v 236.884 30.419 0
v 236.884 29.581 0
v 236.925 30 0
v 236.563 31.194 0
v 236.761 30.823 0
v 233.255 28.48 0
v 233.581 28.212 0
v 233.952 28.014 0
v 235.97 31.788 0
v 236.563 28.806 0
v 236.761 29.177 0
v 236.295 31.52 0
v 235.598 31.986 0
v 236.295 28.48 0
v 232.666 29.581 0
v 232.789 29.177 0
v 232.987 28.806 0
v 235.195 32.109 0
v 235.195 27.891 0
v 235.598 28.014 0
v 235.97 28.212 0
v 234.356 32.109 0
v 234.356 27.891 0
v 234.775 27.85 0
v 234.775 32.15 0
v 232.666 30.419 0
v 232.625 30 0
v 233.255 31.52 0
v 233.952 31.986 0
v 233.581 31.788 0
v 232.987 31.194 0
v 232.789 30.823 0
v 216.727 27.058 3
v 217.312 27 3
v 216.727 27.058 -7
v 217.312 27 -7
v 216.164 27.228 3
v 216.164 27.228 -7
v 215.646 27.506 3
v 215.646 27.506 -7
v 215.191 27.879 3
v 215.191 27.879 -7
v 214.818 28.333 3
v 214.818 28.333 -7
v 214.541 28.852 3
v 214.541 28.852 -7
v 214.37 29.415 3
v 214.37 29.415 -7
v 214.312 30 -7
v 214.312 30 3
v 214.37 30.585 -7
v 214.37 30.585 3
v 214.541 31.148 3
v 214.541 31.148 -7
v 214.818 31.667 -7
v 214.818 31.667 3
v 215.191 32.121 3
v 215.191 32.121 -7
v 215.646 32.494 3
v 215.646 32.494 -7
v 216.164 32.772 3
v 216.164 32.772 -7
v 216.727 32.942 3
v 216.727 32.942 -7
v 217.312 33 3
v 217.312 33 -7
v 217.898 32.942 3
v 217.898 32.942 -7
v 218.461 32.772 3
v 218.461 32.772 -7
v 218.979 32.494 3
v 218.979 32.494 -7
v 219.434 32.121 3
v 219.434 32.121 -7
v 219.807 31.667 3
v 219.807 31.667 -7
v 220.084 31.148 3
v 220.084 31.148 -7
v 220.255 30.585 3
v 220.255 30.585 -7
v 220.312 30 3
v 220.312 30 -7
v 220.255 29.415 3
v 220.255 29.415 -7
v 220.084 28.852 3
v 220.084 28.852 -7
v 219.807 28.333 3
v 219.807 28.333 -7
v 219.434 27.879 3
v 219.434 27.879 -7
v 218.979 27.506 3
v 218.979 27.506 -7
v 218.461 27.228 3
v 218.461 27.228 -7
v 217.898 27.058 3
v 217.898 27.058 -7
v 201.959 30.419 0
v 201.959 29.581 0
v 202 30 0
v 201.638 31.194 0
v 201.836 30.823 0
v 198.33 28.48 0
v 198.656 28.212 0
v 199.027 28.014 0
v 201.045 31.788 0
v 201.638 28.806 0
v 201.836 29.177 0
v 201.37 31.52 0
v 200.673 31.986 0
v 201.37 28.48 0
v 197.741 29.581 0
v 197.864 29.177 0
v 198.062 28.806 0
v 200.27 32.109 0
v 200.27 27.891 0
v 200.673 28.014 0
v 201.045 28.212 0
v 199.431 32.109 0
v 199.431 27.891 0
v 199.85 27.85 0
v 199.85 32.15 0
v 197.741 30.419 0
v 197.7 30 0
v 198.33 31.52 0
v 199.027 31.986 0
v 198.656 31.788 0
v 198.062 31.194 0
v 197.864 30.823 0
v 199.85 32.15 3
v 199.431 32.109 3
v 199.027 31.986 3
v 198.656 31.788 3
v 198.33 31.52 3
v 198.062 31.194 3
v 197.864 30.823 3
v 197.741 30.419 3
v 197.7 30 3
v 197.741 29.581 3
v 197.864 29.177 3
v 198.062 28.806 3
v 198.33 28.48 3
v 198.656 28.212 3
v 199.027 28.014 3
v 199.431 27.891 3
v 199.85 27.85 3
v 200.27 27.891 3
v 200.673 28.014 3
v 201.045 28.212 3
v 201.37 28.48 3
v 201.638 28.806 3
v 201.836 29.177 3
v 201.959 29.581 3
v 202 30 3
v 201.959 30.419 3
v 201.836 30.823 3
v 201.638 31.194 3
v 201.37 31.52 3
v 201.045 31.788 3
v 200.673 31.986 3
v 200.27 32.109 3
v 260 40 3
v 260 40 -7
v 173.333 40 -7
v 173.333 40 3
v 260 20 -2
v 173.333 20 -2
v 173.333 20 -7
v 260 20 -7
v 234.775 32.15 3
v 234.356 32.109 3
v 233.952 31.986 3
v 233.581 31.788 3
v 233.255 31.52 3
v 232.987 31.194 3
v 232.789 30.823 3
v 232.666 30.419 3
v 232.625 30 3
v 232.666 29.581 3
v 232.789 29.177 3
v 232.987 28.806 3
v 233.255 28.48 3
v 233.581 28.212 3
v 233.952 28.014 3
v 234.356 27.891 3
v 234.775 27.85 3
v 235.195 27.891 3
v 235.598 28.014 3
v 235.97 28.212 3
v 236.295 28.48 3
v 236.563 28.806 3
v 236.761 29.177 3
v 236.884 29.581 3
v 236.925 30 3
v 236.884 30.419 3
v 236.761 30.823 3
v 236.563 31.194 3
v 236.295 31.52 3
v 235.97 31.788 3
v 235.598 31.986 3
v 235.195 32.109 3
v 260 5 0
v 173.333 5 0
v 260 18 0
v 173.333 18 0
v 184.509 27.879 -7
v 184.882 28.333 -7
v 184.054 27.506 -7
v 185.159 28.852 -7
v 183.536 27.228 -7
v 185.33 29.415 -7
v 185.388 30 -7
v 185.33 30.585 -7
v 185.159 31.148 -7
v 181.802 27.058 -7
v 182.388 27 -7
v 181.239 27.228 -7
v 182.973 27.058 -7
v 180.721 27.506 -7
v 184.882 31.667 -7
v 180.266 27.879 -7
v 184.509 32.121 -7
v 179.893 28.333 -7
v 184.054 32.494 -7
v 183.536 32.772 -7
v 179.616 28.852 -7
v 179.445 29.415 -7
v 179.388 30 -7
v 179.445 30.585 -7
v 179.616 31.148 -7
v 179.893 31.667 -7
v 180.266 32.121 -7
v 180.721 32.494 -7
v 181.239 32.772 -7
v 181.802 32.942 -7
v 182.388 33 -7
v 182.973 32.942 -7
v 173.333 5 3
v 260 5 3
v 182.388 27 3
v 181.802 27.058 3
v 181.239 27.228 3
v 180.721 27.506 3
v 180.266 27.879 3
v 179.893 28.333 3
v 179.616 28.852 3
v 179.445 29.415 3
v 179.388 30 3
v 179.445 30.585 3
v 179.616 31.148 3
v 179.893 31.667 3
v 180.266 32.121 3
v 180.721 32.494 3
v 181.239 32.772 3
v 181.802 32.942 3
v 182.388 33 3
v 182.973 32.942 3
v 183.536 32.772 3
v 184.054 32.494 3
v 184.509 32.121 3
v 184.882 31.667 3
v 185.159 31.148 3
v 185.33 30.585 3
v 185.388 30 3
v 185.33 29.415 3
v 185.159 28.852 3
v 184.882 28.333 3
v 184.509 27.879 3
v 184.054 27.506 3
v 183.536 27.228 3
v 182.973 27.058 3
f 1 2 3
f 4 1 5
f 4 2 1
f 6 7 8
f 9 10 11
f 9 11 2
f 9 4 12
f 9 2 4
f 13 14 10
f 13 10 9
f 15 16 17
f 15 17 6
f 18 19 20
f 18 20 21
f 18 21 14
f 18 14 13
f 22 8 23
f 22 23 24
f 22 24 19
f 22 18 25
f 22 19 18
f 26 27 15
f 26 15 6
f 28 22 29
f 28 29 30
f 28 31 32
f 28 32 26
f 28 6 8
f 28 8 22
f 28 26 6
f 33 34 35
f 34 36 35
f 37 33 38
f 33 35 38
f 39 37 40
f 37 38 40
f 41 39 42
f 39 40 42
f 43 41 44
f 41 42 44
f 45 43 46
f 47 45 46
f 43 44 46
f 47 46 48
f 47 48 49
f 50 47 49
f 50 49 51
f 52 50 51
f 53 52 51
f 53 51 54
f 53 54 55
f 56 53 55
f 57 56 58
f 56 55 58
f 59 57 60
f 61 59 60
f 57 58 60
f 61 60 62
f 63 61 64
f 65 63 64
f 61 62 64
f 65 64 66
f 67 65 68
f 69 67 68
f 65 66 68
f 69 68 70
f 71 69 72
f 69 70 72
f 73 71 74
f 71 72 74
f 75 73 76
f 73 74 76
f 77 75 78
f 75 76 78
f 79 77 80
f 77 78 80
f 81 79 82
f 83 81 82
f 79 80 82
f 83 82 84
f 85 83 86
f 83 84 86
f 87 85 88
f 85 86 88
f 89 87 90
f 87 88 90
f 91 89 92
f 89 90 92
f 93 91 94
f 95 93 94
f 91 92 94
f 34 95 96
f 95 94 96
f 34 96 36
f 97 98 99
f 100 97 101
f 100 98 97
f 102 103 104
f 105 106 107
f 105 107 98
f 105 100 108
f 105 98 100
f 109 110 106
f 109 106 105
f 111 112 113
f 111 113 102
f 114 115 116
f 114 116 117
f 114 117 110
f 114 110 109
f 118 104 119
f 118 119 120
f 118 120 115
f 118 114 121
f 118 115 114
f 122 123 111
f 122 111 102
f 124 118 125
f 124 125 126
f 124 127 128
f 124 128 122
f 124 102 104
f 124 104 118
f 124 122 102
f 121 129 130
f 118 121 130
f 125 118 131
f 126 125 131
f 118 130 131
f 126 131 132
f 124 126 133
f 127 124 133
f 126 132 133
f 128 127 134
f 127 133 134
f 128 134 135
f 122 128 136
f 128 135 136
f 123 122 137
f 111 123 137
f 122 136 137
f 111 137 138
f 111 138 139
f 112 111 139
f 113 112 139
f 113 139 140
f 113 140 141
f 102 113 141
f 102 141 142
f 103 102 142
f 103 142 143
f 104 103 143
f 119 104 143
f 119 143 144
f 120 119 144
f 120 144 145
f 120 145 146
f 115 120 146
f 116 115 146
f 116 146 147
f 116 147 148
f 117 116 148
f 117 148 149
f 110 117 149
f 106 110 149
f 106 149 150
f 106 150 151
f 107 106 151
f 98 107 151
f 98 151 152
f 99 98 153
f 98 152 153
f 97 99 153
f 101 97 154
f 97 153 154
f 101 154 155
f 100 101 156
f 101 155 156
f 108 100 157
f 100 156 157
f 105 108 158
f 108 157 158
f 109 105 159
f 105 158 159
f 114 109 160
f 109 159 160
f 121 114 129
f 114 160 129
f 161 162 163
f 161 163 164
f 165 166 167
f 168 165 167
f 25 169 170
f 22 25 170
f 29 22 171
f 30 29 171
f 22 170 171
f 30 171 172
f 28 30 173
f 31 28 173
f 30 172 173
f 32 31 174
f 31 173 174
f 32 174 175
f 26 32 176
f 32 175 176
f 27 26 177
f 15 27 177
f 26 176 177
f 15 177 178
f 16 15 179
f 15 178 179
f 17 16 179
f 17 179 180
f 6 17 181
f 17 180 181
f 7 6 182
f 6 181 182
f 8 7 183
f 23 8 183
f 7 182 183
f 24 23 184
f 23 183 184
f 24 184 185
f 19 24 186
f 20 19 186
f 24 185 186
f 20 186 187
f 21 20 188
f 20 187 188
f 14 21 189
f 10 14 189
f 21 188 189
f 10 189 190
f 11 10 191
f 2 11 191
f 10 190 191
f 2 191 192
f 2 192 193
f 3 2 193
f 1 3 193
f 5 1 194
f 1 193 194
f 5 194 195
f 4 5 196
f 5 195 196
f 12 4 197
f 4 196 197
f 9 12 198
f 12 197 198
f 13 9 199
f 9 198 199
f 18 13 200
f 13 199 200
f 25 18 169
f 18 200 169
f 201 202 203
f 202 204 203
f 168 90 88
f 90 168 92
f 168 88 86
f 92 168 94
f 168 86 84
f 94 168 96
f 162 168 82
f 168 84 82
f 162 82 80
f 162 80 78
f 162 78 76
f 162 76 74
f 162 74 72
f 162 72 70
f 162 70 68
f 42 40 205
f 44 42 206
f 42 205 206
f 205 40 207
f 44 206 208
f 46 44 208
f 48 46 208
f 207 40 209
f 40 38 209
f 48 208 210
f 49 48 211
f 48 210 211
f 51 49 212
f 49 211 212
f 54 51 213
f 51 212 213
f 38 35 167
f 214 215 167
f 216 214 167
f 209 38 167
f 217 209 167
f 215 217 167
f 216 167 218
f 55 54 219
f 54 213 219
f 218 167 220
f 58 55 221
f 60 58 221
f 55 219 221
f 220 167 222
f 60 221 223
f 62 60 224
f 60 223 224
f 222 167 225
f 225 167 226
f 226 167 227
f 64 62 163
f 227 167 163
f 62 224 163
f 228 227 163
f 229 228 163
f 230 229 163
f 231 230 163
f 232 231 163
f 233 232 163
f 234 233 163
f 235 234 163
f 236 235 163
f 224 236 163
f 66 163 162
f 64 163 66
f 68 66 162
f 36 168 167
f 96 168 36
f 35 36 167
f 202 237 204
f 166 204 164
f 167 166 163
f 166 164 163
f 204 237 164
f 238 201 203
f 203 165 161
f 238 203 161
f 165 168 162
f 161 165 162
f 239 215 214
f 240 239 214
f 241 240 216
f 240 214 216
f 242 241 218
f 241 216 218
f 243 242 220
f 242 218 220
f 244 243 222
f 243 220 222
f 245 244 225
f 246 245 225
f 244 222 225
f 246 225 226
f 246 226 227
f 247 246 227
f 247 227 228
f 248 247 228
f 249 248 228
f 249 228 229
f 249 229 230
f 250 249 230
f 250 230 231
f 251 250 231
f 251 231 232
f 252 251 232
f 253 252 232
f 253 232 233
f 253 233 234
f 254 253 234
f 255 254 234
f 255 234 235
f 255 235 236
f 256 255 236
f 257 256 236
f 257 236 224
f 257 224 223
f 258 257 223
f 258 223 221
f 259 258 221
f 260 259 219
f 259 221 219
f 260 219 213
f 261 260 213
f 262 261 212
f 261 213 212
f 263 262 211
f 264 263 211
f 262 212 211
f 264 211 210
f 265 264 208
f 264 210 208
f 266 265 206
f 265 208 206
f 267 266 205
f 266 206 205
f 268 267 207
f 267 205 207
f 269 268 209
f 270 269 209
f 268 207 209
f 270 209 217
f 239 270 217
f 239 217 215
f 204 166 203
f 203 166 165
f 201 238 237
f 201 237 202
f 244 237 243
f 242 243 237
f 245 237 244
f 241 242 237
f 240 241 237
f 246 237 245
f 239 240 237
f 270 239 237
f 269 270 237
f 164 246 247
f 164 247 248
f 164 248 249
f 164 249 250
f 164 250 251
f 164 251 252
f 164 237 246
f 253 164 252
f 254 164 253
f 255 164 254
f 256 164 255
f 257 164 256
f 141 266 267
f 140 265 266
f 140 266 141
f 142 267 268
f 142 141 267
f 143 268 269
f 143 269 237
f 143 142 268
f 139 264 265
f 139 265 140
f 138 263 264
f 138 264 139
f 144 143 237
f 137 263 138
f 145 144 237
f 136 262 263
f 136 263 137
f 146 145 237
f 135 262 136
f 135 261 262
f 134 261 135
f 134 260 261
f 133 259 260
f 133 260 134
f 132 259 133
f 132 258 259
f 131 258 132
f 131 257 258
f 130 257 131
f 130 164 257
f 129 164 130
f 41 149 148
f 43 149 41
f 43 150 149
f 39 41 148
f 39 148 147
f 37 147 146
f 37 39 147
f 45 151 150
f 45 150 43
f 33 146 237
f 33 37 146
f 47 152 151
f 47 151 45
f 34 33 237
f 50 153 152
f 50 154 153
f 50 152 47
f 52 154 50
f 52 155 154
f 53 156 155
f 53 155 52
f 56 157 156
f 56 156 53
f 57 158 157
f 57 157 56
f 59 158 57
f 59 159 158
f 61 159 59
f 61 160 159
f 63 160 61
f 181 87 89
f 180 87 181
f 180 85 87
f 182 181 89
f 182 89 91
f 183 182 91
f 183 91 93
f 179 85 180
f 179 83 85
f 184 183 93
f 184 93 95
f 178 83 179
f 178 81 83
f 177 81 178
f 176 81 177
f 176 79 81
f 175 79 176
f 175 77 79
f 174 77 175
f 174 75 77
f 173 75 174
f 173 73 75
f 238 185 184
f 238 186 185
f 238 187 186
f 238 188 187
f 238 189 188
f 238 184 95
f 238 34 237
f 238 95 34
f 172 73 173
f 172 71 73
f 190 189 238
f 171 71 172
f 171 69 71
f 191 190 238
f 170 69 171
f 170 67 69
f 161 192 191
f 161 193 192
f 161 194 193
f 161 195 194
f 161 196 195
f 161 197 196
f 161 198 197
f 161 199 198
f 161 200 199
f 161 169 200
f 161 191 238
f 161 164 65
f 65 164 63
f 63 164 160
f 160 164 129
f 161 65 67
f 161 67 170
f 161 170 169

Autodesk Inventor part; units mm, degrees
ref_plane "YZ Plane" through (0, 0, 0) normal (1, 0, 0) x (0, 1, 0)
sketch "Sketch1" plane through (0, 0, 0) normal (0, 0, 1) x (1, 0, 0)
  line L0 (0, 0) -> (260, 0)
  line L1 (260, 0) -> (260, 20)
  line L2 (260, 20) -> (0, 20)
  line L3 (0, 20) -> (0, 0)
  dimension "d0" = 260
  dimension "d1" = 20
extrude "Extrusion1" add sketch "Sketch1" along normal blind 3
sketch "Sketch2" plane through (0, 0, 0) normal (0, 0, -1) x (-1, 0, 0)
  line L0 (0, 0) -> (-260, 0) projected
  line L1 (-12.5251, -24.7625) -> (-37.9251, -24.7625) projected
  line L2 (-260, 20) -> (0, 20) projected
  point P0 (-25.2251, 30)
  dimension "d5" = 25.4
  dimension "d6" = 12.7
  dimension "d62" = 10
sketch "Sketch5" plane through (0, 0, 0) normal (-1, 0, 0) x (0, 0, 1)
  line L0 (0, 20) -> (3, 20) projected
  line L1 (3, 20) -> (-7, 20)
  line L2 (-7, 20) -> (-7, 40)
  line L3 (-7, 40) -> (3, 40)
  line L4 (3, 40) -> (3, 20)
  point P0 (0, 0)
  point P1 (3, 30)
  point P2 (1.5, 20)
  dimension "d31" = 10
  dimension "d32" = 20
extrude "Extrusion3" add sketch "Sketch5" against normal up to surface (260 mm away)
sketch "Sketch6" plane through (0, 0, 3) normal (0, 0, 1) x (1, 0, 0)
  line L0 (0, 0) -> (0, 40) projected
  line L1 (260, 0) -> (260, 40) projected
  line L2 (0, 40) -> (260, 40) projected
  point P0 (42.6875, 30)
  point P1 (77.6125, 30)
  point P2 (182.3875, 30)
  point P3 (217.3125, 30)
  point P4 (112.5375, 30)
  point P5 (147.4625, 30)
  dimension "d35" = 42.6875
  dimension "d46" = 42.6875
  dimension "d47" = 34.925
  dimension "d48" = 34.925
  dimension "d49" = 34.925
  dimension "d50" = 34.925
  dimension "d51" = 10
hole "Hole2" at (42.6875, 30, 3) at (77.6125, 30, 3) at (182.3875, 30, 3) at (217.3125, 30, 3) at (112.5375, 30, 3) at (147.4625, 30, 3) direction (0, 0, -1) diameter 6 end through all
hole "Hole3" at (25.2251, 30, 0) direction (0, 0, 1) diameter 4.3 depth 6
pattern_linear "Rectangular Pattern2" count 7 spacing 34.925 along (1, 0, 0) of "Hole3"
chamfer "Chamfer1" distance 2 angle 45 1 edges at (130, 20, 0)
sketch "Sketch7" plane through (0, 0, 0) normal (-1, 0, 0) x (0, 0, 1)
  line L0 (0, 0) -> (3, 0) projected
  line L1 (0, 0) -> (3.6796, 0)
  line L2 (3.6796, 0) -> (3.6796, 5)
  line L3 (3.6796, 5) -> (0, 5)
  line L4 (0, 5) -> (0, 0)
  dimension "d66" = 5
extrude "Extrusion4" cut sketch "Sketch7" against normal through all
ref_plane "Work Plane1" through (173.3333, 20, -7) normal (1, 0, 0) x (0, 0, -1)
ref_plane "Work Plane2" through (86.6667, 20, -7) normal (1, 0, 0) x (0, 0, -1)
sketch "Sketch8" plane through (173.3333, 20, -7) normal (1, 0, 0) x (0, 0, -1)
  line L0 (-10, -15) -> (-7, -15) projected
  line L1 (-7, -15) -> (-7, -2) projected
  line L2 (-5, 0) -> (-7, -2) projected
  line L3 (0, 0) -> (-5, 0) projected
  line L4 (0, 20) -> (0, 0) projected
  line L5 (-10, 20) -> (0, 20) projected
  line L6 (-10, -15) -> (-10, 20) projected
  point P0 (-7, -20)
extrude "Extrusion5" cut sketch "Sketch8" against normal through all
equation "\"d6\" = 0.5 * d5"
equation "\"d46\" = d35"
equation "\"d48\" = d47"
equation "\"d49\" = d47"
equation "\"d50\" = d47"
properties part number "IR_Mount_Plate_3DPrint"
